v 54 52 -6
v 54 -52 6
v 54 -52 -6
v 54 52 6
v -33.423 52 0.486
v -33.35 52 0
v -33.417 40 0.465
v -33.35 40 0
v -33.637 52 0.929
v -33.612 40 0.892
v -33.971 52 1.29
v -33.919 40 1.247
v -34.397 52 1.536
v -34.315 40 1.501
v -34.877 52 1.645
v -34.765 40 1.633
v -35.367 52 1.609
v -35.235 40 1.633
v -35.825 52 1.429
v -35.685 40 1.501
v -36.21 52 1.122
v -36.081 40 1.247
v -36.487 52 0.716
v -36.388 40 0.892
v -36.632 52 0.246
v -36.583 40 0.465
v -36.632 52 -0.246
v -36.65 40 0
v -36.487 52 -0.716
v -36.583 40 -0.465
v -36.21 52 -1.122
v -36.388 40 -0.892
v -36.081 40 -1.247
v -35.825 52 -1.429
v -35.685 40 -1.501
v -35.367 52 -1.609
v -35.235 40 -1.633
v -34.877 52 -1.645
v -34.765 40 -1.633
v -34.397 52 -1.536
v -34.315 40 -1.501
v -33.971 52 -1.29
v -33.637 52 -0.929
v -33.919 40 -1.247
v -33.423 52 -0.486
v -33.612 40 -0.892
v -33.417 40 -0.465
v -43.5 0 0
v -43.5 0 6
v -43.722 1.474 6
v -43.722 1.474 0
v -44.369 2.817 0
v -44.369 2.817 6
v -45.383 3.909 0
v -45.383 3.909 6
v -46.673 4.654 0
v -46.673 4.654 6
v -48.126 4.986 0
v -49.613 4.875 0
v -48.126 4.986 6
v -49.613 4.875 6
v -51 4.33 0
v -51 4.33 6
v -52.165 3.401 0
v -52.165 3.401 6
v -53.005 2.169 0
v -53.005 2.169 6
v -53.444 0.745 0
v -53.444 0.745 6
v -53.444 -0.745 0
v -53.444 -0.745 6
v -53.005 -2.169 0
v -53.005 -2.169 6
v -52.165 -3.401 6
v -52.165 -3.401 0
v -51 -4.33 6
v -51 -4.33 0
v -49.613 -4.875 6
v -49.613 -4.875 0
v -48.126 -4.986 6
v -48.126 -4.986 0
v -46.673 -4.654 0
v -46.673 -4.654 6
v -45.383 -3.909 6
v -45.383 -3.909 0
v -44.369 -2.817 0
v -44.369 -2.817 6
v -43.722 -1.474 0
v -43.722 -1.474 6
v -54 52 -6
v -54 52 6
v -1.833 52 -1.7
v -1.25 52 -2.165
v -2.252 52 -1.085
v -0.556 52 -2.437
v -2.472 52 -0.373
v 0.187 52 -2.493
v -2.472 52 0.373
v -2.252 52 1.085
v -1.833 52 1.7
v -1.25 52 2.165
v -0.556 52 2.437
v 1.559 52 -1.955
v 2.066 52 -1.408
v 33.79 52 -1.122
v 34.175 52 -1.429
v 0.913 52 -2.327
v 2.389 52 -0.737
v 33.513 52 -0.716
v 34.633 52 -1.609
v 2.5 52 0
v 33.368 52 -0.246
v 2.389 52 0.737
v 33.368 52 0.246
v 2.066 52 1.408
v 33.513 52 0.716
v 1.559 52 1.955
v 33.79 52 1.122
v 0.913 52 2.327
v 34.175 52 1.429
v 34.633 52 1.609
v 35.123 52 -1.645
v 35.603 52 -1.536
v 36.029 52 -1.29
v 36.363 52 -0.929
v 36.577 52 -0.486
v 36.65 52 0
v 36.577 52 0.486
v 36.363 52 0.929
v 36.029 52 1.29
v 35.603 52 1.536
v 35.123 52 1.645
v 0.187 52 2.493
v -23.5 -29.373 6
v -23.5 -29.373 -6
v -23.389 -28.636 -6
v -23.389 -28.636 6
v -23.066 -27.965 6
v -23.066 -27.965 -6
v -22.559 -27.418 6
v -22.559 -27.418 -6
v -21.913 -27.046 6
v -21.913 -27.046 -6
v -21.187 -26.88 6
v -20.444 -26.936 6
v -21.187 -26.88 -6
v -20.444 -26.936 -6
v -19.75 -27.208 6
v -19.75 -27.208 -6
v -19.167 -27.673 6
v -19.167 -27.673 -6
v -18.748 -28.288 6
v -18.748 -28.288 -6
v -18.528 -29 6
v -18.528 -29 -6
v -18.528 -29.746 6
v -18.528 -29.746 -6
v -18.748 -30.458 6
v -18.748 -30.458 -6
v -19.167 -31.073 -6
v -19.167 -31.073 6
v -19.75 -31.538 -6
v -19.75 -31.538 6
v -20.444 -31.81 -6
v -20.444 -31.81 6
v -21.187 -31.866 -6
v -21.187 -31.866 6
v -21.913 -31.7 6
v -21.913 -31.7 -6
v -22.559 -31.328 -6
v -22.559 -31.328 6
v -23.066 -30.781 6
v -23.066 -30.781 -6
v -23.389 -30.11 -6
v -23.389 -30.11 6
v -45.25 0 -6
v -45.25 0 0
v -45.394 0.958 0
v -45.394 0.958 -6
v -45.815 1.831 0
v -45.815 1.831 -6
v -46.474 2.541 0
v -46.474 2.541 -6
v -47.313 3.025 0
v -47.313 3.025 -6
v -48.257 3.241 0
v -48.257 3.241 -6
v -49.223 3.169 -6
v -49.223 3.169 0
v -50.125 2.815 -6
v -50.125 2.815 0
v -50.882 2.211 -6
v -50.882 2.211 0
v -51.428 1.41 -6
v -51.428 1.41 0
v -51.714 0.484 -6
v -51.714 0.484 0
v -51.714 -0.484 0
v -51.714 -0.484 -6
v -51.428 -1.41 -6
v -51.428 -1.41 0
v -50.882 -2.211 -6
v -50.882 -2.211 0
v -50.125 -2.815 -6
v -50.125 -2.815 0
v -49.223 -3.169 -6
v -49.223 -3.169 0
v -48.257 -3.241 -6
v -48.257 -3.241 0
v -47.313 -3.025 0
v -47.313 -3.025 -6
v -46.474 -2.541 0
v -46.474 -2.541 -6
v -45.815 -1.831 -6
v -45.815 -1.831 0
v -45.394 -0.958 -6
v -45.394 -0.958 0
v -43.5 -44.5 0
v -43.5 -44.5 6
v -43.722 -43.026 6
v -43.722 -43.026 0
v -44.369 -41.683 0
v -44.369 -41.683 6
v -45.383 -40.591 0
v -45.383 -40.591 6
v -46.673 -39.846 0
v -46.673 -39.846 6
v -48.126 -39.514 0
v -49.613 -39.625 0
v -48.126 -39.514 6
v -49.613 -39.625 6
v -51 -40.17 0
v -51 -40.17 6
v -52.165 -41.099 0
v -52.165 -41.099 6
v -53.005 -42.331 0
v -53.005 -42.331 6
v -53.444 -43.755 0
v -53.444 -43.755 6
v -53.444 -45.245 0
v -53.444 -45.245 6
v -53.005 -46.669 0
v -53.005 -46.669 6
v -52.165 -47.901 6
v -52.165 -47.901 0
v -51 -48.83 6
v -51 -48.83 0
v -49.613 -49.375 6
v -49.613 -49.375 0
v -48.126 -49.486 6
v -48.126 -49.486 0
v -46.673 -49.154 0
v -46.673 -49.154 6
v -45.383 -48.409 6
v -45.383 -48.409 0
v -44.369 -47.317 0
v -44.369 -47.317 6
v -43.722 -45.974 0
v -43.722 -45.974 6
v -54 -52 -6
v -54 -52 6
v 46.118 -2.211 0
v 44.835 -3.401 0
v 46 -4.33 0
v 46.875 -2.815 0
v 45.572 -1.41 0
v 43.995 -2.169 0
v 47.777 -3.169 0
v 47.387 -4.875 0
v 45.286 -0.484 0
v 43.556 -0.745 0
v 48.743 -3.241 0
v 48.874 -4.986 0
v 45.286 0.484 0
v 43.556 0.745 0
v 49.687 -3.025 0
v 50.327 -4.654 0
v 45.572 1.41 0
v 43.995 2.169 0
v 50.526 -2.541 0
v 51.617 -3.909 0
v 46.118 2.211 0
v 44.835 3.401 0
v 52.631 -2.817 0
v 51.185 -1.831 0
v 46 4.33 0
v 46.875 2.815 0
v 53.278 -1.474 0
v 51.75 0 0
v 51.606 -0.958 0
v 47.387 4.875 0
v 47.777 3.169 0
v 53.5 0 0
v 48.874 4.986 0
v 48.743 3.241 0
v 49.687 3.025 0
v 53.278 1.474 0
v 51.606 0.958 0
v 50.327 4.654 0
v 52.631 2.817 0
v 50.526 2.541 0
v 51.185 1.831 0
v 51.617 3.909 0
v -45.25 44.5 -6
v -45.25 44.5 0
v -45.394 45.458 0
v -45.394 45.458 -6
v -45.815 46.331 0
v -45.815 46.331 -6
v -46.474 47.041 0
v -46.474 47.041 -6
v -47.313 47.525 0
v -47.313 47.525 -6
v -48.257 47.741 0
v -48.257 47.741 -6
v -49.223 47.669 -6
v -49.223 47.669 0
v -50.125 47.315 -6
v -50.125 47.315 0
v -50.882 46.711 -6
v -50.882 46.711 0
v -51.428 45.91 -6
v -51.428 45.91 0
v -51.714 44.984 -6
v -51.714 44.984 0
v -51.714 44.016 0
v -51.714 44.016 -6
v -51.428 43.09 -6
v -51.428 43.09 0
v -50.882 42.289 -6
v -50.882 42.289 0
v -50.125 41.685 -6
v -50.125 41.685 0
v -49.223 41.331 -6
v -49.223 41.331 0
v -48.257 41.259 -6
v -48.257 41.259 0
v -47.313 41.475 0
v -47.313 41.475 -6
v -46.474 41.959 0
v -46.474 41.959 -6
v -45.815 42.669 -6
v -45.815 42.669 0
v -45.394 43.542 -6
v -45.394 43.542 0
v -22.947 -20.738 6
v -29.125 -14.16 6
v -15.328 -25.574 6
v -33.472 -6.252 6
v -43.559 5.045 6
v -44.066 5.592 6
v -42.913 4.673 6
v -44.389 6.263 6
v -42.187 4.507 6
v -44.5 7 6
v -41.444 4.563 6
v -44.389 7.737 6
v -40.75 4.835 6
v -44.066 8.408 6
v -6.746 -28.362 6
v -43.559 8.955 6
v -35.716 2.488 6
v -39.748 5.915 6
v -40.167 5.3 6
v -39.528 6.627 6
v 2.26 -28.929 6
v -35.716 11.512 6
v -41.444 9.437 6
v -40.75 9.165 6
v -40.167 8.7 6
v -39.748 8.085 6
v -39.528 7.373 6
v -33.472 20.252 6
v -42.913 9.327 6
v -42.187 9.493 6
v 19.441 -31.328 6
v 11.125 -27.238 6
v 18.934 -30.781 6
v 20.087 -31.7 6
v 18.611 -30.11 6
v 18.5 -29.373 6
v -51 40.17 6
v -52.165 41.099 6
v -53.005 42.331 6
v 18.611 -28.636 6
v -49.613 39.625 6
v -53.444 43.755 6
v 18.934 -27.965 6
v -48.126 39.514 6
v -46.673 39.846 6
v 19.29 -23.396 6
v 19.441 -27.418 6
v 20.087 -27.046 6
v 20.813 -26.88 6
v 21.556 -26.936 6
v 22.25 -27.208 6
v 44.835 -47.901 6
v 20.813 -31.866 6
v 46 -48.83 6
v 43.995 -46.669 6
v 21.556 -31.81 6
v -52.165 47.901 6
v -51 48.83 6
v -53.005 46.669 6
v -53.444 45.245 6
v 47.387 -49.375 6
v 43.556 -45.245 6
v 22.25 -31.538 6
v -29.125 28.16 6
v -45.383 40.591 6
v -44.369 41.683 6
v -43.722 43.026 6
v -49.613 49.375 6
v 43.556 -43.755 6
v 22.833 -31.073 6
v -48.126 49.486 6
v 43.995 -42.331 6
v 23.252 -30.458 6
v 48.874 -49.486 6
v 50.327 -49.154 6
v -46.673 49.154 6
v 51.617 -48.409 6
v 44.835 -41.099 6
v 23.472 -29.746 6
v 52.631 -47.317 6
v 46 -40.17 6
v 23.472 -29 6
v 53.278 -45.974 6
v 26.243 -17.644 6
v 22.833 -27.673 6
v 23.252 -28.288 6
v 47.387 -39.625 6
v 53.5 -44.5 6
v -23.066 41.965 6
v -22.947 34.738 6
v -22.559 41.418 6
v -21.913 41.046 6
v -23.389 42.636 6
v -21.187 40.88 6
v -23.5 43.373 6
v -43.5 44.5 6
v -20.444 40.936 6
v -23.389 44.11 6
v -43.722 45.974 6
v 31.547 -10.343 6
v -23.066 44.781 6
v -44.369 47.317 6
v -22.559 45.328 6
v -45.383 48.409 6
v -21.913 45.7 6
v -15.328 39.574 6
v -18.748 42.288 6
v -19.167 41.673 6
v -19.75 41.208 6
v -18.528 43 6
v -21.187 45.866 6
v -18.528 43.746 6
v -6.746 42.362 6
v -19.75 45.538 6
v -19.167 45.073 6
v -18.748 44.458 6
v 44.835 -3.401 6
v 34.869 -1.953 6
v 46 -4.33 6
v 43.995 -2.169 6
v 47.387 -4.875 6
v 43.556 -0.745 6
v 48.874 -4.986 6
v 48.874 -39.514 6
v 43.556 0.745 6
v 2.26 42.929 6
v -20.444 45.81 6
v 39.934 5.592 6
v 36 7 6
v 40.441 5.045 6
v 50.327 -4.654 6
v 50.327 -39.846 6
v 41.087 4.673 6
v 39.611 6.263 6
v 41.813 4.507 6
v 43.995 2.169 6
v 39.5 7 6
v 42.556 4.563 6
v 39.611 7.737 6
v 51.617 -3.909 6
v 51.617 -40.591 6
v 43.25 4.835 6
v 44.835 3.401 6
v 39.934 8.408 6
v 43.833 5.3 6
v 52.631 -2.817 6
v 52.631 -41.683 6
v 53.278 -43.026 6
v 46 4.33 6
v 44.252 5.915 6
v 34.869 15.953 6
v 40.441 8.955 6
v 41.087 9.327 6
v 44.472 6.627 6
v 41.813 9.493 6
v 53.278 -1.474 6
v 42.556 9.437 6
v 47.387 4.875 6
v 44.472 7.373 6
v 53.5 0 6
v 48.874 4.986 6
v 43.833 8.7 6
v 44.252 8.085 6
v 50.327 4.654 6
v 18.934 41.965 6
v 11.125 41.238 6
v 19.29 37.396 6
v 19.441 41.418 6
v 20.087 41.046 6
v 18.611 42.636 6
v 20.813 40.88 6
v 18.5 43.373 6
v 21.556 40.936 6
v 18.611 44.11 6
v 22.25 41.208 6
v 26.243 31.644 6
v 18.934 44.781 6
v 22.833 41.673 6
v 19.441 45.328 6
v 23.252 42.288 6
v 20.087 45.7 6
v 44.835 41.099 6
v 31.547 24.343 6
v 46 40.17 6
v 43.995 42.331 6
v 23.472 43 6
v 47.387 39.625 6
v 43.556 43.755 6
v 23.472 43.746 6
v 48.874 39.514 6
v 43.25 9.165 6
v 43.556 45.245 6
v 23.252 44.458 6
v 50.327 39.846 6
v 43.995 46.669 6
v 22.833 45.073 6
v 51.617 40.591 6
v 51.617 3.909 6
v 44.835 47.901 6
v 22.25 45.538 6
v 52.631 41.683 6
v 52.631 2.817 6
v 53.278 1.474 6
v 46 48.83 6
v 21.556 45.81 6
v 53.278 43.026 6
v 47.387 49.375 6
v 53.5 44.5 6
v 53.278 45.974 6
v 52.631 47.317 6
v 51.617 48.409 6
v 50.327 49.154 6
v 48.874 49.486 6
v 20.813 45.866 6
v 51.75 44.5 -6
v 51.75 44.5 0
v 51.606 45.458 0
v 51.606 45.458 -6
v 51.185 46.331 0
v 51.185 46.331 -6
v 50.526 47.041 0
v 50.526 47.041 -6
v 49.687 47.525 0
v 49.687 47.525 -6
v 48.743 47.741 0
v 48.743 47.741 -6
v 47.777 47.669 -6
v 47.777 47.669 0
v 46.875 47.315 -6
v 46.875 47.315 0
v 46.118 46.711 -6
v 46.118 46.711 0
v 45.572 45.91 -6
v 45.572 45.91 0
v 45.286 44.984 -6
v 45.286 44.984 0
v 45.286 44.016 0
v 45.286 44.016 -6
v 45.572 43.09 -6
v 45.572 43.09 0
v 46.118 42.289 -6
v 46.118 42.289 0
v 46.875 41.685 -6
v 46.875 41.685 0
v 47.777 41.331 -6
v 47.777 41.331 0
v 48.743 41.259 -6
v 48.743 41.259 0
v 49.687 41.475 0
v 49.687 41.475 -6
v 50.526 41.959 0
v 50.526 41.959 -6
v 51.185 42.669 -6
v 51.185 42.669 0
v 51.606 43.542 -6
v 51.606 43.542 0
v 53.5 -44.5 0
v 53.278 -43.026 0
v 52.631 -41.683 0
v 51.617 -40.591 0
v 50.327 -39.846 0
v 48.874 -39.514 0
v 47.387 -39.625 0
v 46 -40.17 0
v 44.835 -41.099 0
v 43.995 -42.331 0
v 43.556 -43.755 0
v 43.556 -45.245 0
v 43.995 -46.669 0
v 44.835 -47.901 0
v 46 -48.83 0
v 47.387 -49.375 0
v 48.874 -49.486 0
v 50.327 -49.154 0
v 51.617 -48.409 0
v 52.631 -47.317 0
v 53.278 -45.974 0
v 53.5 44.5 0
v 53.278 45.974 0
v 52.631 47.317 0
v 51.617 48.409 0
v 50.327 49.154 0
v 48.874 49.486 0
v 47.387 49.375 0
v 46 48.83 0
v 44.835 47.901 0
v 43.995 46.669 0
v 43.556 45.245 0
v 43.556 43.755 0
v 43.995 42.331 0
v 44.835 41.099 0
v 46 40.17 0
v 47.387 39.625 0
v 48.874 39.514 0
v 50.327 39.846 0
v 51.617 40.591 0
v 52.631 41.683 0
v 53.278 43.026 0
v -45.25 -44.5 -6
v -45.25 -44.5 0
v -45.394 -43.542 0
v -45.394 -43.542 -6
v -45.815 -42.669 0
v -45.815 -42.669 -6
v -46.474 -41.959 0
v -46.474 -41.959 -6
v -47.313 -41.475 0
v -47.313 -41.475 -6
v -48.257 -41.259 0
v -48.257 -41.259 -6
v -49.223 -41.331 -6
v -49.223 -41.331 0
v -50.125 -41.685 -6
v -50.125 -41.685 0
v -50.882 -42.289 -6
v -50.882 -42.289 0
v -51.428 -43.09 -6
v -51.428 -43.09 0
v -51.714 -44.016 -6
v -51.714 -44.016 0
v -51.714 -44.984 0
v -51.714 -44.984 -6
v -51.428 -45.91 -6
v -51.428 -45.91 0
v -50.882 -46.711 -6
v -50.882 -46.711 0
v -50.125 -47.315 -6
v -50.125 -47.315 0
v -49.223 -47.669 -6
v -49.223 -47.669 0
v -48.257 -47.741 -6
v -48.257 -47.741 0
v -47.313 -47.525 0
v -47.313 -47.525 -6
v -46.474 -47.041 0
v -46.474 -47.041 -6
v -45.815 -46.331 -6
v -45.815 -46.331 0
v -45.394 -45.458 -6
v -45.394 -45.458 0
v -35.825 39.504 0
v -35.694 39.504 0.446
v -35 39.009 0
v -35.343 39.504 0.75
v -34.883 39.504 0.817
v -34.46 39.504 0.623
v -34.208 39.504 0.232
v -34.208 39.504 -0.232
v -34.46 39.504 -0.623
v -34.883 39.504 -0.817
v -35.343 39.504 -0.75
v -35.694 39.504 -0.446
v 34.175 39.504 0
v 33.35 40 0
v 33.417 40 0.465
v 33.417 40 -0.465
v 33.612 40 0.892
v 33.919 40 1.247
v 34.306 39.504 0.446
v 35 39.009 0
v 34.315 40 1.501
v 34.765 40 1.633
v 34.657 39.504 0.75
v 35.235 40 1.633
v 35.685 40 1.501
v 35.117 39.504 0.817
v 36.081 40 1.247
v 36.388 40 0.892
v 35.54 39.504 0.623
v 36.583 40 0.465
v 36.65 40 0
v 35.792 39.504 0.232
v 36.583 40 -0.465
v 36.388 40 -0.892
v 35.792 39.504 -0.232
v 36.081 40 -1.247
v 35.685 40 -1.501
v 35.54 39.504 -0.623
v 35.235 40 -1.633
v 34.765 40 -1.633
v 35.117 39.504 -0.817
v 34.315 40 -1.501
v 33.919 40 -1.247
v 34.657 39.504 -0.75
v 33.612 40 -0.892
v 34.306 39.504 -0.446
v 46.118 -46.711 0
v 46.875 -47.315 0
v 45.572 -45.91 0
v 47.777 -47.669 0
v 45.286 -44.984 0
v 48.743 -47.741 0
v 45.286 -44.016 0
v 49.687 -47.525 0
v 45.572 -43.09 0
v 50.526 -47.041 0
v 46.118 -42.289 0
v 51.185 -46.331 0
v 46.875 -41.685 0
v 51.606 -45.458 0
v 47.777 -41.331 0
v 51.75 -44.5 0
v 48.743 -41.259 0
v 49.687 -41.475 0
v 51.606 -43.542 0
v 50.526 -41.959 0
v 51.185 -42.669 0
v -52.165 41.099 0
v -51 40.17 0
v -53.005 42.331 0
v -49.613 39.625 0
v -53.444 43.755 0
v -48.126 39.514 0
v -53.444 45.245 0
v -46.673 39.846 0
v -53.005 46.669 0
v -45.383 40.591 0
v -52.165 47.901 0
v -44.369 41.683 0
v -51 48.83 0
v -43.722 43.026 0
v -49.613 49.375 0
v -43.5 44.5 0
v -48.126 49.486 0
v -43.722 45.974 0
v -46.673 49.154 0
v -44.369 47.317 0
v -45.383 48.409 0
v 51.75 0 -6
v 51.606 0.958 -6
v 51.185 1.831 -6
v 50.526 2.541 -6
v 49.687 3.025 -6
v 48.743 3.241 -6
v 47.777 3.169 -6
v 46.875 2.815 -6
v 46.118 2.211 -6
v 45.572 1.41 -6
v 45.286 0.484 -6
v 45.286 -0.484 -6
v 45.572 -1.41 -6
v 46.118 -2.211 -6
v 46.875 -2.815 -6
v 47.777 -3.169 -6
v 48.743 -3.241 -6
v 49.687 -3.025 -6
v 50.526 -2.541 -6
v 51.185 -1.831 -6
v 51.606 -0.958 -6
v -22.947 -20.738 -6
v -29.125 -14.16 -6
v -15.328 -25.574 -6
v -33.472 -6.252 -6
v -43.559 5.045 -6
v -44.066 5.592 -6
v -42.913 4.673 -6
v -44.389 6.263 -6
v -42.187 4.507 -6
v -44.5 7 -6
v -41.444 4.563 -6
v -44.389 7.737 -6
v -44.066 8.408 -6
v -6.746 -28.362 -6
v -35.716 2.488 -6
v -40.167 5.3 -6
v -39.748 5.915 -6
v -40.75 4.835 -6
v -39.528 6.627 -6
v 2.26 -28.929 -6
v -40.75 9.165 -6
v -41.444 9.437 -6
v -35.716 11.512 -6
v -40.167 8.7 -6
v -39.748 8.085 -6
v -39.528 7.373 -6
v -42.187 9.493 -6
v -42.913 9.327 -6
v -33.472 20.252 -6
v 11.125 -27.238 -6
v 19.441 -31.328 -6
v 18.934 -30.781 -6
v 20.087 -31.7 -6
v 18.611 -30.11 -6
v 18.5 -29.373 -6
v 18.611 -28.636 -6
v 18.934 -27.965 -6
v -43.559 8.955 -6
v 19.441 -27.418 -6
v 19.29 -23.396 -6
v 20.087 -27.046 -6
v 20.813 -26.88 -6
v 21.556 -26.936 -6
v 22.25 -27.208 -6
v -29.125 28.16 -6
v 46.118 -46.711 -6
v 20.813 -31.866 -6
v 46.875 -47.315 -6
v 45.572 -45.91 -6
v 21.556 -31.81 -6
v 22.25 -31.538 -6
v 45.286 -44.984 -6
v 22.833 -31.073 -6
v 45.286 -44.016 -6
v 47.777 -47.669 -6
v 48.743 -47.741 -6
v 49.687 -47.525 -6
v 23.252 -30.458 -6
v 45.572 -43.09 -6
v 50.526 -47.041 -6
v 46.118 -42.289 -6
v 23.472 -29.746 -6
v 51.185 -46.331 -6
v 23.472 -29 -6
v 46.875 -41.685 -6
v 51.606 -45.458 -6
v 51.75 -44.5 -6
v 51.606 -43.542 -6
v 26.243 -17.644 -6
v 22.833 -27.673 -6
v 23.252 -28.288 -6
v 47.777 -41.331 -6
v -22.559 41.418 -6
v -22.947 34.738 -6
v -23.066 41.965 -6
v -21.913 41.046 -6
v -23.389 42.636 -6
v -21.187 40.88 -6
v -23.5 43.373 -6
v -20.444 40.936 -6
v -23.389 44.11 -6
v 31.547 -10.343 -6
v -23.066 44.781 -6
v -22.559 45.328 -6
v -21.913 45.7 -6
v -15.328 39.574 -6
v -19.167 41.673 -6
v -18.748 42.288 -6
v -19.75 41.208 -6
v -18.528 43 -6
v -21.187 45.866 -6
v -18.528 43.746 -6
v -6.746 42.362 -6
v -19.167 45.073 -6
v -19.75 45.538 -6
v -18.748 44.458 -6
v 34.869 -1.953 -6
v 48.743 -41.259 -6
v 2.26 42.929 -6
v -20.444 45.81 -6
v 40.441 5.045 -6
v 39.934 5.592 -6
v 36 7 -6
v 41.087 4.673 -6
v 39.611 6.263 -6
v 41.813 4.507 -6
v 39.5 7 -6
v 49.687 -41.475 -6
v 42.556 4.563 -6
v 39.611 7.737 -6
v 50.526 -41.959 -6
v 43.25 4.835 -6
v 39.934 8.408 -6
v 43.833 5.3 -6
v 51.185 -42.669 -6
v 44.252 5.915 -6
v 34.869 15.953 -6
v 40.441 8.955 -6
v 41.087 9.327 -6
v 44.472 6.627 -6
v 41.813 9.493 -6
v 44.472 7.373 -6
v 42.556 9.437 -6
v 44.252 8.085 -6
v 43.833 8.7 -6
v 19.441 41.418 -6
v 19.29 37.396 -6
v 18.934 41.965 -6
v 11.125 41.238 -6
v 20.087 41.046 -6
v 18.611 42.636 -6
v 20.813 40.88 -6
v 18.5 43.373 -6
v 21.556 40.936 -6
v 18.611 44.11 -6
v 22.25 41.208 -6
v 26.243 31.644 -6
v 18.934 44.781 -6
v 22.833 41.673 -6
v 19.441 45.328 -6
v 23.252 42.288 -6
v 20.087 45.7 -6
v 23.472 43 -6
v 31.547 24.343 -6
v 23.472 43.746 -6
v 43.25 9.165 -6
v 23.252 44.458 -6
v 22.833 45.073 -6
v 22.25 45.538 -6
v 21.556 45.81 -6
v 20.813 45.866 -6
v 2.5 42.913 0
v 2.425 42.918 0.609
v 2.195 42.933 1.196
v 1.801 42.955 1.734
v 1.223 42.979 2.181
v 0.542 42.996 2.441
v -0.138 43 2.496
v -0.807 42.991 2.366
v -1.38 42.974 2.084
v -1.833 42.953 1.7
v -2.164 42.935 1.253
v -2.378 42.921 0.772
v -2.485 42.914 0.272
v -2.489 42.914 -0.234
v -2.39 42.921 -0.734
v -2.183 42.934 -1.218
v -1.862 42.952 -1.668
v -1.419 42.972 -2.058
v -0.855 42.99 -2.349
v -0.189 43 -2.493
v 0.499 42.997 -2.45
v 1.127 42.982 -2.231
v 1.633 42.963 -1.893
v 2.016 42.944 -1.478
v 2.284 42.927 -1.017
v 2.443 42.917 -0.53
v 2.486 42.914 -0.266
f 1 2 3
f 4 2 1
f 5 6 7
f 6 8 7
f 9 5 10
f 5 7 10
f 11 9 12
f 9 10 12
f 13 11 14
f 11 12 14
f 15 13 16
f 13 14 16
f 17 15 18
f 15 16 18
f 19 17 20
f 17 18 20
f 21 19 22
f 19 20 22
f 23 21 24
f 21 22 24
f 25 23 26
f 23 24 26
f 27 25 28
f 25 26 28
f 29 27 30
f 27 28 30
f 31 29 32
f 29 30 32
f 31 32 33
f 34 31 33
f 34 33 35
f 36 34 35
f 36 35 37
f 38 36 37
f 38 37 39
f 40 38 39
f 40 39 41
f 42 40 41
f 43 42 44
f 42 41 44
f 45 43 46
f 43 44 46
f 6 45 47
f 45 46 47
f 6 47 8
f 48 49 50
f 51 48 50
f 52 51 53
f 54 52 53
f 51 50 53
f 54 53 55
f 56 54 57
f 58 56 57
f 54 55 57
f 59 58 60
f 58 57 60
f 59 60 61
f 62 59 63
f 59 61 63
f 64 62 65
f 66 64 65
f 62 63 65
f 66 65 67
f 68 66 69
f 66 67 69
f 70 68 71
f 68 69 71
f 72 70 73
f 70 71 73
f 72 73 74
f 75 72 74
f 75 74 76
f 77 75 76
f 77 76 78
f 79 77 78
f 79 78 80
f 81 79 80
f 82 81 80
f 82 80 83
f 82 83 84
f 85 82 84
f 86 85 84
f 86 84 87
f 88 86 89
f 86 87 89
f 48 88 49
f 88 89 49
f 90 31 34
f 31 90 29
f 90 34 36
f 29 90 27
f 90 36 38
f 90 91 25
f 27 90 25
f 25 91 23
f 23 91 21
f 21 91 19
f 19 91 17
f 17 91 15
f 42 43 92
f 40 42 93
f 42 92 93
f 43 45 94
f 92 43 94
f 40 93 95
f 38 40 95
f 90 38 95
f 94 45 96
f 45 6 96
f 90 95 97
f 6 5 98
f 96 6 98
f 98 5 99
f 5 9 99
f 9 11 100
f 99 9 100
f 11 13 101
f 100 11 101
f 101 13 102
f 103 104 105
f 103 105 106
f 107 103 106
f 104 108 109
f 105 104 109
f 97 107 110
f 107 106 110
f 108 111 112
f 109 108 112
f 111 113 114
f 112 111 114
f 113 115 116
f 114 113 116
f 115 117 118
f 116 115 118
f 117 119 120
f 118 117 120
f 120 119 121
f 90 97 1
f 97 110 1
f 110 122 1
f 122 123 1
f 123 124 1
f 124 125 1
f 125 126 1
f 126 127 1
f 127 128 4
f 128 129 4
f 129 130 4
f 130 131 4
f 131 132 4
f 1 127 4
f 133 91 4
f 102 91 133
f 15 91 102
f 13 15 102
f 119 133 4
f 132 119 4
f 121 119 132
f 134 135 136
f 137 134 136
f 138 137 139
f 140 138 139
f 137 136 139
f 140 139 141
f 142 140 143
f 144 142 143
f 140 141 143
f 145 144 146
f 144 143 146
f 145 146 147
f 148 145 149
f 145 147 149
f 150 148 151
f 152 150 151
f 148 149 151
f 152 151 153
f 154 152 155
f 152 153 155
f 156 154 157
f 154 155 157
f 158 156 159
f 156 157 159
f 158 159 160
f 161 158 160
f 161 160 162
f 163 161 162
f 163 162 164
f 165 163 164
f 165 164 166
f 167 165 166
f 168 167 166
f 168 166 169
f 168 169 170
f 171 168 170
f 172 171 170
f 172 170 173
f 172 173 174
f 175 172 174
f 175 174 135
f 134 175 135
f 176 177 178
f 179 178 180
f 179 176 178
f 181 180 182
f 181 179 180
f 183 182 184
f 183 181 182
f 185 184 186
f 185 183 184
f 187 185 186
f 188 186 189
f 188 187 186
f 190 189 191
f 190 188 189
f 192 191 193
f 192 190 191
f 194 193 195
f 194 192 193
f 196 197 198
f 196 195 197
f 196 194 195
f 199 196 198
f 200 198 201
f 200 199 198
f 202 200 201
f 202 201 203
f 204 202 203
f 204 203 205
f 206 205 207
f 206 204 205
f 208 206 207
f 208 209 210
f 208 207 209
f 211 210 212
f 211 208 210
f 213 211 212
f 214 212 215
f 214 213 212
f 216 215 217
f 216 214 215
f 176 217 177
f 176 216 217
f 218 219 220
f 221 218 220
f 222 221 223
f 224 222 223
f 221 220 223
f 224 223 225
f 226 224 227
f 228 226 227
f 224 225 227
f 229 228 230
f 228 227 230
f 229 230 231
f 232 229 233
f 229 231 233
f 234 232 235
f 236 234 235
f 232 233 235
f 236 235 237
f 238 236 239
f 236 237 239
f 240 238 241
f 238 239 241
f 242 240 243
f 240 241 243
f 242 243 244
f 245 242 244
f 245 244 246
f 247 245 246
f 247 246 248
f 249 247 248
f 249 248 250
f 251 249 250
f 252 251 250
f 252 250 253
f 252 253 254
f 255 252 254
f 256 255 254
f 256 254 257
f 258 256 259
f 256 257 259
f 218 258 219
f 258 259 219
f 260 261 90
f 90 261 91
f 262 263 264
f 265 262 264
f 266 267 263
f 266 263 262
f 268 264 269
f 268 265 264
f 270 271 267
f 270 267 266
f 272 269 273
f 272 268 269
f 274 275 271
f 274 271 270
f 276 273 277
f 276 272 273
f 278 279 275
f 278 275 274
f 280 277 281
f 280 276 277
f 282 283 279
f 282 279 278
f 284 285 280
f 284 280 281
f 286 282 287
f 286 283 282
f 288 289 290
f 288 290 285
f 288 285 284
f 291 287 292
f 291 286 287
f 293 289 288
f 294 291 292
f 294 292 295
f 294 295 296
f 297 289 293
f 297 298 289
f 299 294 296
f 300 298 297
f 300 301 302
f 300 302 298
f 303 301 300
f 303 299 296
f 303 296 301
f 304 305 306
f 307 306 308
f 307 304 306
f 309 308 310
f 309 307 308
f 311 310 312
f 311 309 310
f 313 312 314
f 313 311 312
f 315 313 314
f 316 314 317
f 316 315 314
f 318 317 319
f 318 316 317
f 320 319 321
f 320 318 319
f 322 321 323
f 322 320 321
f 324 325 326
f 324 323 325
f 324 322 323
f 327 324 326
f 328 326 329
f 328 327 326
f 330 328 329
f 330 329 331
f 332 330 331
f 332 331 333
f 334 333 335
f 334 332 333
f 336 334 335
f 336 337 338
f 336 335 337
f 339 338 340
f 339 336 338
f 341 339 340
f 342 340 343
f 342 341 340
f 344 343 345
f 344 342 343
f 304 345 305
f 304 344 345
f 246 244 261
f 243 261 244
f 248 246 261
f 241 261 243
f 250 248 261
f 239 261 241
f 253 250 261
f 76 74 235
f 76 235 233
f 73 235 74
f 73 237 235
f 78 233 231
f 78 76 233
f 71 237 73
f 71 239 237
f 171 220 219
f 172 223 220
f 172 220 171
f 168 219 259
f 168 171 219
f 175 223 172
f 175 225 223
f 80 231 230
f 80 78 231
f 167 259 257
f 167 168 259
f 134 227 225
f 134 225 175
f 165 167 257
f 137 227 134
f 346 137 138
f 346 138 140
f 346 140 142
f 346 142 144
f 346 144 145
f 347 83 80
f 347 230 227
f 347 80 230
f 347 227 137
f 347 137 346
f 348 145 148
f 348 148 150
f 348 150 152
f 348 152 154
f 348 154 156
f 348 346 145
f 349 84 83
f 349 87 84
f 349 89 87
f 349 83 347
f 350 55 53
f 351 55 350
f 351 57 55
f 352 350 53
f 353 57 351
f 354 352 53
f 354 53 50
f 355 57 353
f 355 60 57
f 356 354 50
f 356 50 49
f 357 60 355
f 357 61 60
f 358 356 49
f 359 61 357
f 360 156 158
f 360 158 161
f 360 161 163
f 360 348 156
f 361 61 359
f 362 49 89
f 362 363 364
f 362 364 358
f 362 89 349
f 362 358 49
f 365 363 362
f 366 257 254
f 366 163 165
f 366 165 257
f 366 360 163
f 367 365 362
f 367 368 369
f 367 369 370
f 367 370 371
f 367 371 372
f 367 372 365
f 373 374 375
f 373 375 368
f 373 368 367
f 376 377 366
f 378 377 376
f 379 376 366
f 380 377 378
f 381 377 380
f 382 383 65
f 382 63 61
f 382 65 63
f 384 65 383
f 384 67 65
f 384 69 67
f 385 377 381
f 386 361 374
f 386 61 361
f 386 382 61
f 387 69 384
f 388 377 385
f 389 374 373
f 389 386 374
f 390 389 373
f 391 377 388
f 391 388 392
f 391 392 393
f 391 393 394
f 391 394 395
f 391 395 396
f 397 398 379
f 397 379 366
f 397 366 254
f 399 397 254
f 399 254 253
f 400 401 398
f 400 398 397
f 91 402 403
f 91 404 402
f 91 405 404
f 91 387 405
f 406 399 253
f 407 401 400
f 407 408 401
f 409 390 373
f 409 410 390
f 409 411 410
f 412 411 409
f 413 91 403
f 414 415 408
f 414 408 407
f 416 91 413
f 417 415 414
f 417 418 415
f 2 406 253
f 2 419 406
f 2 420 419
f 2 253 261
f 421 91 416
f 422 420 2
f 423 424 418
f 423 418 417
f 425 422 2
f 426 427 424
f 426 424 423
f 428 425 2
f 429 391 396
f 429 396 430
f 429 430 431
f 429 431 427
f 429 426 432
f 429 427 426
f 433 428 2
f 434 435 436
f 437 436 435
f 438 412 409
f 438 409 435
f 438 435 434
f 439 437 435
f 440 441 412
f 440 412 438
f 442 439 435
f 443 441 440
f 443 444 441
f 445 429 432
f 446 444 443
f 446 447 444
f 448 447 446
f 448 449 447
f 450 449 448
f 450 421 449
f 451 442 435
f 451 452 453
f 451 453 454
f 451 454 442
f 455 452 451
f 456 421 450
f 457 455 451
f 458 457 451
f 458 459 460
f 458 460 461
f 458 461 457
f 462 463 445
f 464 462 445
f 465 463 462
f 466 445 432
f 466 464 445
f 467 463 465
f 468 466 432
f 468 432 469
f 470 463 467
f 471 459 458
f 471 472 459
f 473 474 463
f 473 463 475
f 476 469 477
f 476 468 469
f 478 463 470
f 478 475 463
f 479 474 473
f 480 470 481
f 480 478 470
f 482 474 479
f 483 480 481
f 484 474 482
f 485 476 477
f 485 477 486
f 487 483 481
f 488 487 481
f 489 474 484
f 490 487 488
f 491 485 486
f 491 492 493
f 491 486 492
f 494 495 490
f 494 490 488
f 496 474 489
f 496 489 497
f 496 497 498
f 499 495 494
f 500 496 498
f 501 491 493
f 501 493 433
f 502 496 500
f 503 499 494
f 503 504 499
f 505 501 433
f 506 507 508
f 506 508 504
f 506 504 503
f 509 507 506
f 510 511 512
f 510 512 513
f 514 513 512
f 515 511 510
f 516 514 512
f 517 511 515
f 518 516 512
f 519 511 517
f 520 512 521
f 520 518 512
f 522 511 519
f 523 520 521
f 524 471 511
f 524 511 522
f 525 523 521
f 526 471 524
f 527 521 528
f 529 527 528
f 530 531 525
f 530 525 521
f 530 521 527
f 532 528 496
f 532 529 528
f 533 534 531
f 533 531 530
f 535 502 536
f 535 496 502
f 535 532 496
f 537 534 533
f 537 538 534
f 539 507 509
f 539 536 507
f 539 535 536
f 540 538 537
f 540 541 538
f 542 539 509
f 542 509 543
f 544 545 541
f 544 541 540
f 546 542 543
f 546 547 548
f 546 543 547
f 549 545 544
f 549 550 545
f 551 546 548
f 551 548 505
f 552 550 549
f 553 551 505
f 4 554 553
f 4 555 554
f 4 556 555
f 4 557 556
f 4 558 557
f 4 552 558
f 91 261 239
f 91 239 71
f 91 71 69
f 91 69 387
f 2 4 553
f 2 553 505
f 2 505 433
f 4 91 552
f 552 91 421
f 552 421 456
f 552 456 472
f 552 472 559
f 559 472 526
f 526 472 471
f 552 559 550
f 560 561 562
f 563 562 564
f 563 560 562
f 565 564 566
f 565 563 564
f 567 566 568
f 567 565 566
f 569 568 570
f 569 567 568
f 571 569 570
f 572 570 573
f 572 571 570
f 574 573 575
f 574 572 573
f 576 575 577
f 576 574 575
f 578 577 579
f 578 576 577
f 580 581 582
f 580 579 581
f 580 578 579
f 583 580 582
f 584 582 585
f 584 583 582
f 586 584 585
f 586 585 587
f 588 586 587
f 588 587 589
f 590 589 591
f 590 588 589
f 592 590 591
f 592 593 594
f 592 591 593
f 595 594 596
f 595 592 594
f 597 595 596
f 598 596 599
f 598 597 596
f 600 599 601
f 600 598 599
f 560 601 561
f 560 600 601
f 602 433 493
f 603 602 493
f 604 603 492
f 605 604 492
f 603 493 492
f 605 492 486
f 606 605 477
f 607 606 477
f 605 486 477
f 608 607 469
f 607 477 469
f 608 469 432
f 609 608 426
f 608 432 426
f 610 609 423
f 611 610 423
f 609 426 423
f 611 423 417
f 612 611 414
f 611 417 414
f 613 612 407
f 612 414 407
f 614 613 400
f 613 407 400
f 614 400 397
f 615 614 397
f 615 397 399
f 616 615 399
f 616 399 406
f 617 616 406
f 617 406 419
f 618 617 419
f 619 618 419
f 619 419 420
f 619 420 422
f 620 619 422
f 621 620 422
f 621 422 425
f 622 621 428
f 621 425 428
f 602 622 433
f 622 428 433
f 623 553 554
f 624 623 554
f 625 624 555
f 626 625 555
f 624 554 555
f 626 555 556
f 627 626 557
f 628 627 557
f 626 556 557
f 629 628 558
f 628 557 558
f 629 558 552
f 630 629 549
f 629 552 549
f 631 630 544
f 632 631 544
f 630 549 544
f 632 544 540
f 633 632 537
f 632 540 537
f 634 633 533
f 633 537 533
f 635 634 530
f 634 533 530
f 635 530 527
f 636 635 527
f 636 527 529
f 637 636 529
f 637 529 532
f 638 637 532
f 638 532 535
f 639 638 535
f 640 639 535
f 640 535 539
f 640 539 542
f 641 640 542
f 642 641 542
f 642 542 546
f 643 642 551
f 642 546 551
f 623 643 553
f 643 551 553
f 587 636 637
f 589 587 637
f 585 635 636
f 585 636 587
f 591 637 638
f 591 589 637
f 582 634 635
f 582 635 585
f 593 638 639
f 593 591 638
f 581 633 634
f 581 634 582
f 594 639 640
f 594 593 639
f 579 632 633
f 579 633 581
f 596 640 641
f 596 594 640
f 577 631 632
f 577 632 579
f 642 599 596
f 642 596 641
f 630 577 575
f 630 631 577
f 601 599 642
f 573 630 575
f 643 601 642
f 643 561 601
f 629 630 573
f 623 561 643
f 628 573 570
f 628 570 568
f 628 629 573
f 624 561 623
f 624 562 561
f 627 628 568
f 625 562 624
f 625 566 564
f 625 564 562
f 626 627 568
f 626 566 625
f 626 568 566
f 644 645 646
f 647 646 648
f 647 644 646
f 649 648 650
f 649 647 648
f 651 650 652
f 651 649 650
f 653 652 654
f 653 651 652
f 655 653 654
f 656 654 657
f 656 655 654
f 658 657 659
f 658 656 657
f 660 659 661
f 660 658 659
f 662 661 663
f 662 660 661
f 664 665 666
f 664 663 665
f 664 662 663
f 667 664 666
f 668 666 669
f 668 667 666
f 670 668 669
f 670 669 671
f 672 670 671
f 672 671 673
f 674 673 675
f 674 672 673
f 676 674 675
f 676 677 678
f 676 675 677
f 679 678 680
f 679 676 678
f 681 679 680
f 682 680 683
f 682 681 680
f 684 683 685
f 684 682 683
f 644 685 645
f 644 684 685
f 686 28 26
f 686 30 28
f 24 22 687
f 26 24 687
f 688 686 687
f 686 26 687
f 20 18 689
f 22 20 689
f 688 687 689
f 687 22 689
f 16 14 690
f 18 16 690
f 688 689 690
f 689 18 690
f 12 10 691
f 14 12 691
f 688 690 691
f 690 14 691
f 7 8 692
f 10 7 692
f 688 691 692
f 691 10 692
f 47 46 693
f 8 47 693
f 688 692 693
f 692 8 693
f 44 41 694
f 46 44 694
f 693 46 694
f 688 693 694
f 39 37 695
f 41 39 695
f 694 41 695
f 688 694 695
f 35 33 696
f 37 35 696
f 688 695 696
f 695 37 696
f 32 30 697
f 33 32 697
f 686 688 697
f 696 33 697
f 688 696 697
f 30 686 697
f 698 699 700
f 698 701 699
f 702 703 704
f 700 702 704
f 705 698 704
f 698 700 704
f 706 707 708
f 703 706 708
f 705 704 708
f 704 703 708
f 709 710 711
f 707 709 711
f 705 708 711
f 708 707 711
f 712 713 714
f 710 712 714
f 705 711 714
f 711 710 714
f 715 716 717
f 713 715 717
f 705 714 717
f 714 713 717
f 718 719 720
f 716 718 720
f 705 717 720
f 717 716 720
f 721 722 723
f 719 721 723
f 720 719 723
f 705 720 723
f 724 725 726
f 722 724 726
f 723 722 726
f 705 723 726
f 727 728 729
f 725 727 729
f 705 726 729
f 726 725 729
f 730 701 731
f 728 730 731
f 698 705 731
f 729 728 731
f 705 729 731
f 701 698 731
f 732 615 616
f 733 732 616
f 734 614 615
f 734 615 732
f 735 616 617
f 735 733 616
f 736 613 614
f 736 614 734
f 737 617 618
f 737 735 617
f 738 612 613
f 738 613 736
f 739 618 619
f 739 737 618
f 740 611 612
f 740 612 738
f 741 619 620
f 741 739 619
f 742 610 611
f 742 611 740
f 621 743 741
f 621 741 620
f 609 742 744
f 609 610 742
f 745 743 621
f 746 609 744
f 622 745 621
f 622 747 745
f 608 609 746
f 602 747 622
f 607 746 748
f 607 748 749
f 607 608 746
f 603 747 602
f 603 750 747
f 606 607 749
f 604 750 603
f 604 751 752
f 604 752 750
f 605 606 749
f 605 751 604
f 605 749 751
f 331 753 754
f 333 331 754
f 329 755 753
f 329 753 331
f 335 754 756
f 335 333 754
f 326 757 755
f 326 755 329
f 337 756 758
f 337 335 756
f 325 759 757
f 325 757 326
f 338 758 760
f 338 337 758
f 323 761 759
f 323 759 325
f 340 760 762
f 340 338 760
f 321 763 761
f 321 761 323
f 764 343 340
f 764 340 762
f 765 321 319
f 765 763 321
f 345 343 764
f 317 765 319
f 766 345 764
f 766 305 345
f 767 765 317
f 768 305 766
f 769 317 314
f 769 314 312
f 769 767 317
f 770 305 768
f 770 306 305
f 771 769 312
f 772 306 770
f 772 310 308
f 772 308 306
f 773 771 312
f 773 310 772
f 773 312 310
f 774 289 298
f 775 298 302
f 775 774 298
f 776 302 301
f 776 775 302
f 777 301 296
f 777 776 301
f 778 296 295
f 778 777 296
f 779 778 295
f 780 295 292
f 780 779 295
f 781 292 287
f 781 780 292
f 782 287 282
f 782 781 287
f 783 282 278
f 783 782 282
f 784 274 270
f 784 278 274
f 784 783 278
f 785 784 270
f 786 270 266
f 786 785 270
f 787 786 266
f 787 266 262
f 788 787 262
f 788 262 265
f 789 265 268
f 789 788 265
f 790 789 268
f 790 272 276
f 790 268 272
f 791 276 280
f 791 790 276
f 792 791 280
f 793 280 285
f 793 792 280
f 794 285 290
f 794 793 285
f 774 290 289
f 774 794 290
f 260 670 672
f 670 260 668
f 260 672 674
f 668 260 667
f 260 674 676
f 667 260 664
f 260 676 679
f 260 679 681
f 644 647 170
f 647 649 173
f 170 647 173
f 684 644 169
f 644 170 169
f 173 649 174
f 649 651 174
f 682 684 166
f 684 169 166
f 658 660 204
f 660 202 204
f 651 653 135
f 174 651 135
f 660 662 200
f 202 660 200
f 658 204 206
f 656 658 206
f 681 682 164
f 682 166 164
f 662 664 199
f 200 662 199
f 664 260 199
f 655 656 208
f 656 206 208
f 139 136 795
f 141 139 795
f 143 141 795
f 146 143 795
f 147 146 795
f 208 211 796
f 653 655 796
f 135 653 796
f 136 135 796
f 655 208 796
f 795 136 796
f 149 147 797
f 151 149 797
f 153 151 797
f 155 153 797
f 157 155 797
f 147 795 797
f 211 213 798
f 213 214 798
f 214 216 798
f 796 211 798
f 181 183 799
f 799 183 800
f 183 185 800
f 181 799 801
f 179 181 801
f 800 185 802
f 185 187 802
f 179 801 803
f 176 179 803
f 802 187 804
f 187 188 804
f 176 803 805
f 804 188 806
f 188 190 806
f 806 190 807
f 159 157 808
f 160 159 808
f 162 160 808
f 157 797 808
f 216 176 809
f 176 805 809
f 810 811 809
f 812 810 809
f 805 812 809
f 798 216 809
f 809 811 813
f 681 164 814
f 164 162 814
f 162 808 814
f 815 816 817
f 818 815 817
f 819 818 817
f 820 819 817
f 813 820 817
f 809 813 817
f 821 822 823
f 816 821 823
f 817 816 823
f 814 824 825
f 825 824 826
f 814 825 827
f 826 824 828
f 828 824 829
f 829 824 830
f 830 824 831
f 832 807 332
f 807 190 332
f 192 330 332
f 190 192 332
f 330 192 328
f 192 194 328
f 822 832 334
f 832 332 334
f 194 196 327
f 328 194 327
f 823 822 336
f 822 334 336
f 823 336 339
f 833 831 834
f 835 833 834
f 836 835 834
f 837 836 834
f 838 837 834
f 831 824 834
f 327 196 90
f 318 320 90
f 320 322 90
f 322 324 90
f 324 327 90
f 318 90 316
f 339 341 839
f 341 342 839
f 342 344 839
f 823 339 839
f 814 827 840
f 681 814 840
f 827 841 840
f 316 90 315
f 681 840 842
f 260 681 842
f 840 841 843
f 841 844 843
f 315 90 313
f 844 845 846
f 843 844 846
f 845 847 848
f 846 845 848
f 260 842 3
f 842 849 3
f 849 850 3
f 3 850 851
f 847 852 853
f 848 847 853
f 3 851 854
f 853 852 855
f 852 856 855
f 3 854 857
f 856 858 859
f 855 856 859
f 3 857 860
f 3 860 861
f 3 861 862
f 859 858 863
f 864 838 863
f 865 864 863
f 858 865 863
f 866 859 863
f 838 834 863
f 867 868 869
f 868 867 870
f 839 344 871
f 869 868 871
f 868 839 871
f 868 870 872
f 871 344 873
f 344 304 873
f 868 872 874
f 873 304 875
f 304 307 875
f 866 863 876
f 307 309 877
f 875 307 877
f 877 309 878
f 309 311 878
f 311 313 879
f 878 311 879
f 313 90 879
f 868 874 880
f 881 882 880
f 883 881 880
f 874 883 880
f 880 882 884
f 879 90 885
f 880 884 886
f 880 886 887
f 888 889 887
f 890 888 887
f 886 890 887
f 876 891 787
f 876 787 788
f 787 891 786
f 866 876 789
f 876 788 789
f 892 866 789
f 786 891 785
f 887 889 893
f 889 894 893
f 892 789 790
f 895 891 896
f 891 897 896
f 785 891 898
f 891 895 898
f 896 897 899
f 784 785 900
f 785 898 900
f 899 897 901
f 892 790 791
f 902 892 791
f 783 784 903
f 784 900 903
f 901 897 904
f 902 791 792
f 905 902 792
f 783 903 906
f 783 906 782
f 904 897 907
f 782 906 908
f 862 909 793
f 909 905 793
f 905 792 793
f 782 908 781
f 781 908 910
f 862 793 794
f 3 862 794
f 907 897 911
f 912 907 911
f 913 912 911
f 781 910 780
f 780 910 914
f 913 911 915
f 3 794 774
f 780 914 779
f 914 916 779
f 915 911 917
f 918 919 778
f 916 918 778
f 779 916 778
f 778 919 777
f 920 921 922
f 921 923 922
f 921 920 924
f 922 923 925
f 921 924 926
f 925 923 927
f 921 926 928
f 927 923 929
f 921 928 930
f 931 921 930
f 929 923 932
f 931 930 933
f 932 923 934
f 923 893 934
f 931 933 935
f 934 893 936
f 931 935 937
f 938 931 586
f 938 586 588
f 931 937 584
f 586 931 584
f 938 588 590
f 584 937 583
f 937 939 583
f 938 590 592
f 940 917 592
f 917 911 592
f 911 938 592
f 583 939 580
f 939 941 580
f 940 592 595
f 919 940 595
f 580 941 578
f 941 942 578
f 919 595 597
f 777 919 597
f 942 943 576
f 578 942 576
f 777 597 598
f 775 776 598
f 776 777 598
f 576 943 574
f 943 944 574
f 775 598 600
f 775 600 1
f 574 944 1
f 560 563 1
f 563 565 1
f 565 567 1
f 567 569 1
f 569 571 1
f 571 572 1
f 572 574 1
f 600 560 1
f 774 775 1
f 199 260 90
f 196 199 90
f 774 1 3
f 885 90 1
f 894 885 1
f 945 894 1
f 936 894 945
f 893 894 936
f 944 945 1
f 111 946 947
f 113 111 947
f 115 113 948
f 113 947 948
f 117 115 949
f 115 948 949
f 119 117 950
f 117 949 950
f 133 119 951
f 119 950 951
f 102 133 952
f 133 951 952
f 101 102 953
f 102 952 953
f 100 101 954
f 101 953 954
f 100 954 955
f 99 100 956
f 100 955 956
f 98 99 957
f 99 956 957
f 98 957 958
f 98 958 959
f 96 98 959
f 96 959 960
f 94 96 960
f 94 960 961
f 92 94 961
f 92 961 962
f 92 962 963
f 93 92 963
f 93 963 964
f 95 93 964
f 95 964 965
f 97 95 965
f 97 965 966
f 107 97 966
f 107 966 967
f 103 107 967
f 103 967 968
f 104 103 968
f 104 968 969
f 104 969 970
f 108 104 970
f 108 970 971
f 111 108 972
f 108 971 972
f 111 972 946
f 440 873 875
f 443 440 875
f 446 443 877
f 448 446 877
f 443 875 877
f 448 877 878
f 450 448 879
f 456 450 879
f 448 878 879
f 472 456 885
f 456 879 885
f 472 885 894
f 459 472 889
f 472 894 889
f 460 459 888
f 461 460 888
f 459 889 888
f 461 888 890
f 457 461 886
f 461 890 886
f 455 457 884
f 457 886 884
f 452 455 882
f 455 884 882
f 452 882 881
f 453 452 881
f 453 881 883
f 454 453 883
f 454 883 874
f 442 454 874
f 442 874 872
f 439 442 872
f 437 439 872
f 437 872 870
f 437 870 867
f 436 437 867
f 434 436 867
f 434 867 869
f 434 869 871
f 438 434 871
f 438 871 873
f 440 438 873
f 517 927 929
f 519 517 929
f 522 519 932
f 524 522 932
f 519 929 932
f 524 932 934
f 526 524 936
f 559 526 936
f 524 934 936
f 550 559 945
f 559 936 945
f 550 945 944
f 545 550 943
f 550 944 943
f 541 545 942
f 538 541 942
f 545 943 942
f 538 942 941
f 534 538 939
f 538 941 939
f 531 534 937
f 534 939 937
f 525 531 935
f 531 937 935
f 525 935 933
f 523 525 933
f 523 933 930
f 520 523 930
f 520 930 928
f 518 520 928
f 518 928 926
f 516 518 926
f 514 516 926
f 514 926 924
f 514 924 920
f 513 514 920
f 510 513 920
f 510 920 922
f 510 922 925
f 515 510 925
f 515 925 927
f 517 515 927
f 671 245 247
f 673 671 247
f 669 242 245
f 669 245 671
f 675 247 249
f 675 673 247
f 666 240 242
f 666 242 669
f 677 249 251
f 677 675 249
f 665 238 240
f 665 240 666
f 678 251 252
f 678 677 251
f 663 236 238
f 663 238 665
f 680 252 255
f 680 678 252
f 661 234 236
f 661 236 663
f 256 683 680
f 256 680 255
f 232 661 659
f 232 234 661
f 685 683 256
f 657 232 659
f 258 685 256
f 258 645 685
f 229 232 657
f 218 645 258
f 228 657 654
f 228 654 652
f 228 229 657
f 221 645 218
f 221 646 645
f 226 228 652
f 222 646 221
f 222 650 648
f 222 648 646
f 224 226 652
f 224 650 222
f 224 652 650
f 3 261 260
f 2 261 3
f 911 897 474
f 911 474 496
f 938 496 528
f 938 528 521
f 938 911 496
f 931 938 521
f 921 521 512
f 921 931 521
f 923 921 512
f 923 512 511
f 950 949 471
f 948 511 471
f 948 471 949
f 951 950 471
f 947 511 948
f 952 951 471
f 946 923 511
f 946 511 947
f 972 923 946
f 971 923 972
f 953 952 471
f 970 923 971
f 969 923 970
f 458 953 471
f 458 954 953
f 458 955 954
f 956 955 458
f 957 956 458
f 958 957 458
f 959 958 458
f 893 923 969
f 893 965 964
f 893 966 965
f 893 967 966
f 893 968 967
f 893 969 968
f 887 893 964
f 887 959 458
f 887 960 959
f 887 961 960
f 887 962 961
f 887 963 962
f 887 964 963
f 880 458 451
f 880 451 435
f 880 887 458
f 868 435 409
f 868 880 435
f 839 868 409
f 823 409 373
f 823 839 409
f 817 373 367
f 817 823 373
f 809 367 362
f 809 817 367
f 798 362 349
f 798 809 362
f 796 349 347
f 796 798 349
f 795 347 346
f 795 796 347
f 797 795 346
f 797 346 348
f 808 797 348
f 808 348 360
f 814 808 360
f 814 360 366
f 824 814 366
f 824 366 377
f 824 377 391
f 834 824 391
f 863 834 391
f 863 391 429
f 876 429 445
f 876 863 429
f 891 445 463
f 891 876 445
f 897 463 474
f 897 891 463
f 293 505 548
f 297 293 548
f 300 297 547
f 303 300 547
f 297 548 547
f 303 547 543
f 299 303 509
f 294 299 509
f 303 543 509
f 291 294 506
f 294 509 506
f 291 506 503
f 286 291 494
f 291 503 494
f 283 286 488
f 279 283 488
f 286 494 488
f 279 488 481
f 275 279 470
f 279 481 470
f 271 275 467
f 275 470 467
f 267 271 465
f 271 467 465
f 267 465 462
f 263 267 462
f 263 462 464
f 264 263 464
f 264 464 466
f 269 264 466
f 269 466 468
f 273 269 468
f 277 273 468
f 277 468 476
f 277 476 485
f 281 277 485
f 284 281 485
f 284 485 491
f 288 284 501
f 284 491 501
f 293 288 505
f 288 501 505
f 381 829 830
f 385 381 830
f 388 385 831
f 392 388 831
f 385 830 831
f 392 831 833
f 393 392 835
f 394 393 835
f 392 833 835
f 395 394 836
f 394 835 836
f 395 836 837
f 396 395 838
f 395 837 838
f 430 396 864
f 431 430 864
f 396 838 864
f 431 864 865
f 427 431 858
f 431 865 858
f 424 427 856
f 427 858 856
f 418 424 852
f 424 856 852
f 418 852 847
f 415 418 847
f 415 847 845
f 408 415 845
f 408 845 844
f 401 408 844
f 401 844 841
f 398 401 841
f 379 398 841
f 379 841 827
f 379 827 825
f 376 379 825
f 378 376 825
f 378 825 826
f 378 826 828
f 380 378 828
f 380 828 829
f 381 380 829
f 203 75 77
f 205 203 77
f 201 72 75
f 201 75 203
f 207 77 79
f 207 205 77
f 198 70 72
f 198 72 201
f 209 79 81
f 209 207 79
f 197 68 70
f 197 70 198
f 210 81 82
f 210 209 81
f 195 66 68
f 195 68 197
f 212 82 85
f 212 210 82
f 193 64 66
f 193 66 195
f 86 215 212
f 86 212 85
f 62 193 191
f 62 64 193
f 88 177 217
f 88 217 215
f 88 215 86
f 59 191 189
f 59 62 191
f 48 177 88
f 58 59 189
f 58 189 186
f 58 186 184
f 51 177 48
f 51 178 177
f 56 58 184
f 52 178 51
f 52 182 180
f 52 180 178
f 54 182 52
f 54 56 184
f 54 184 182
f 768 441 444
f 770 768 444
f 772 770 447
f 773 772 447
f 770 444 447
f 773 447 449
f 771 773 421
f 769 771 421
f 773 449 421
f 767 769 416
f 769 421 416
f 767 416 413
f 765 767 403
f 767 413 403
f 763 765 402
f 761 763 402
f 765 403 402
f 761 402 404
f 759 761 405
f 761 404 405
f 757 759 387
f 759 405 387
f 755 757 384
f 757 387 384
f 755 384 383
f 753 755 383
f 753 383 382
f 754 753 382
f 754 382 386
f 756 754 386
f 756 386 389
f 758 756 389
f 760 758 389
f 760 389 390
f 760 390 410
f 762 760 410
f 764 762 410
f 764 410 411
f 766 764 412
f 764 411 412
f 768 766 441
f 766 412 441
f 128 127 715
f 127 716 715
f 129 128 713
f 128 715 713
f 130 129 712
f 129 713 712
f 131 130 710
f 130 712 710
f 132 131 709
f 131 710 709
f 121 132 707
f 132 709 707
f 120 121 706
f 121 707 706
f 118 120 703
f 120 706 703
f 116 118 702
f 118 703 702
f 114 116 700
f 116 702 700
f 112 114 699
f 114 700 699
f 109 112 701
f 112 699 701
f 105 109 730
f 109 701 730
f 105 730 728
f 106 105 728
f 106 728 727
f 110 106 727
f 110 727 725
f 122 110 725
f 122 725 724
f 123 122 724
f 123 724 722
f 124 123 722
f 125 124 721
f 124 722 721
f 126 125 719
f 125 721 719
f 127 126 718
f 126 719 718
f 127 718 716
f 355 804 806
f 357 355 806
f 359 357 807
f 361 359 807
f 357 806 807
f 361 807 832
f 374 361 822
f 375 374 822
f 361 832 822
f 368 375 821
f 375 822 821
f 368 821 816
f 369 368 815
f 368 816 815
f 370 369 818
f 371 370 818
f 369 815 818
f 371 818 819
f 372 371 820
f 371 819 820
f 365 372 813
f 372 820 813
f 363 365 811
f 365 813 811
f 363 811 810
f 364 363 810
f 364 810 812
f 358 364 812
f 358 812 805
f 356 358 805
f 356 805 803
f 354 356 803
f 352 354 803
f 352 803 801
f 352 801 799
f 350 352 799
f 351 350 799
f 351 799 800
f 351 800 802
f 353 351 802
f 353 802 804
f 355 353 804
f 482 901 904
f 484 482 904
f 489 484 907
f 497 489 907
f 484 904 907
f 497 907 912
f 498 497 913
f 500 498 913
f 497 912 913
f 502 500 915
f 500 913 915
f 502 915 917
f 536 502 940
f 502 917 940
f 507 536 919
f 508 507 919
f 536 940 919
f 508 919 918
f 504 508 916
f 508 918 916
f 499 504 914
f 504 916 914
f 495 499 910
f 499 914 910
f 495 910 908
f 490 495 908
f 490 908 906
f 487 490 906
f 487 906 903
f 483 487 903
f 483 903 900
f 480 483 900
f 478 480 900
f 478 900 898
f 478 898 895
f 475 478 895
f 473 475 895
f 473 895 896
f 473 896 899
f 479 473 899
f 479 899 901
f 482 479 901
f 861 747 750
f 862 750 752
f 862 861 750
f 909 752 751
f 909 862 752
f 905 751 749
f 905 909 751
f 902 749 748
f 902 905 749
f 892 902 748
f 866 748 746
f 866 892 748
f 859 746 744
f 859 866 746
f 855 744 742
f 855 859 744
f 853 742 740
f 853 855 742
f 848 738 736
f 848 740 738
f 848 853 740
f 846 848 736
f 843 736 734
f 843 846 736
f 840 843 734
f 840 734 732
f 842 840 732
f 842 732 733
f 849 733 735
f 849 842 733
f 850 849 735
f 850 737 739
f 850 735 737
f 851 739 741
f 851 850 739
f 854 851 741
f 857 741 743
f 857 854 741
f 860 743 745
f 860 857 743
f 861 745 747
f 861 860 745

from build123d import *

# Parameters (mm, degrees)
CROQUIS1_W                = 108
CROQUIS1_H                = 104
CROQUIS1_R                = 36
CROQUIS1_R_2              = 3.25
SALIENTE_EXTRUIR1_DEPTH   = 6
TALADRO_ROSCADO_M61_D     = 5
CROQUIS4_R                = 5
CORTAR_EXTRUIR1_DEPTH     = 6
TALADRO_ROSCADO_M62_D     = 5
TALADRO_ROSCADO_M62_DEPTH = 27
TALADRO_ROSCADO_M62_TIP   = 1.502151548
TALADRO_ROSCADO_M41_D     = 3.3
TALADRO_ROSCADO_M41_DEPTH = 12
TALADRO_ROSCADO_M41_TIP   = 0.991420021


with BuildPart() as part:
    # Croquis1 → Saliente-Extruir1 (new body, symmetric)
    with BuildSketch(Plane.XY):
        Rectangle(CROQUIS1_W, CROQUIS1_H)
        with Locations((0, 7)):
            Circle(CROQUIS1_R, mode=Mode.SUBTRACT)
        with Locations((-48.5, 44.5)):
            Circle(CROQUIS1_R_2, mode=Mode.SUBTRACT)
        with Locations((-48.5, 0)):
            Circle(CROQUIS1_R_2, mode=Mode.SUBTRACT)
        with Locations((-48.5, -44.5)):
            Circle(CROQUIS1_R_2, mode=Mode.SUBTRACT)
        with Locations((48.5, -44.5)):
            Circle(CROQUIS1_R_2, mode=Mode.SUBTRACT)
        with Locations((48.5, 0)):
            Circle(CROQUIS1_R_2, mode=Mode.SUBTRACT)
        with Locations((48.5, 44.5)):
            Circle(CROQUIS1_R_2, mode=Mode.SUBTRACT)
    extrude(amount=SALIENTE_EXTRUIR1_DEPTH, both=True)

    # Taladro roscado M61 (through all)
    with Locations(Plane.XY.offset(6)):
        with Locations((-21, 43.373066959), (-42, 7), (-21, -29.373066959), (21, -29.373066959), (42, 7), (21, 43.373066959)):
            Hole(TALADRO_ROSCADO_M61_D / 2)

    # Croquis4 → Cortar-Extruir1 (cut)
    with BuildSketch(Plane.XY.offset(6)):
        with Locations((-48.5, 44.5)):
            Circle(CROQUIS4_R)
        with Locations((-48.5, 0)):
            Circle(CROQUIS4_R)
        with Locations((-48.5, -44.5)):
            Circle(CROQUIS4_R)
        with Locations((48.5, -44.5)):
            Circle(CROQUIS4_R)
        with Locations((48.5, 0)):
            Circle(CROQUIS4_R)
        with Locations((48.5, 44.5)):
            Circle(CROQUIS4_R)
    extrude(amount=-CORTAR_EXTRUIR1_DEPTH, mode=Mode.SUBTRACT)

    # Taladro roscado M62
    with Locations(Plane(origin=(0, 52, 0), x_dir=(-1, 0, 0), z_dir=(0, 1, 0))):
        with Locations((0, 0)):
            Hole(TALADRO_ROSCADO_M62_D / 2, depth=TALADRO_ROSCADO_M62_DEPTH)
            with Locations((0, 0, -(TALADRO_ROSCADO_M62_DEPTH + TALADRO_ROSCADO_M62_TIP / 2))):  # 118° drill point
                Cone(0, TALADRO_ROSCADO_M62_D / 2, TALADRO_ROSCADO_M62_TIP, mode=Mode.SUBTRACT)

    # Taladro roscado M41
    with Locations(Plane(origin=(0, 52, 0), x_dir=(-1, 0, 0), z_dir=(0, 1, 0))):
        with Locations((35, 0), (-35, 0)):
            Hole(TALADRO_ROSCADO_M41_D / 2, depth=TALADRO_ROSCADO_M41_DEPTH)
            with Locations((0, 0, -(TALADRO_ROSCADO_M41_DEPTH + TALADRO_ROSCADO_M41_TIP / 2))):  # 118° drill point
                Cone(0, TALADRO_ROSCADO_M41_D / 2, TALADRO_ROSCADO_M41_TIP, mode=Mode.SUBTRACT)


solid = part.part
